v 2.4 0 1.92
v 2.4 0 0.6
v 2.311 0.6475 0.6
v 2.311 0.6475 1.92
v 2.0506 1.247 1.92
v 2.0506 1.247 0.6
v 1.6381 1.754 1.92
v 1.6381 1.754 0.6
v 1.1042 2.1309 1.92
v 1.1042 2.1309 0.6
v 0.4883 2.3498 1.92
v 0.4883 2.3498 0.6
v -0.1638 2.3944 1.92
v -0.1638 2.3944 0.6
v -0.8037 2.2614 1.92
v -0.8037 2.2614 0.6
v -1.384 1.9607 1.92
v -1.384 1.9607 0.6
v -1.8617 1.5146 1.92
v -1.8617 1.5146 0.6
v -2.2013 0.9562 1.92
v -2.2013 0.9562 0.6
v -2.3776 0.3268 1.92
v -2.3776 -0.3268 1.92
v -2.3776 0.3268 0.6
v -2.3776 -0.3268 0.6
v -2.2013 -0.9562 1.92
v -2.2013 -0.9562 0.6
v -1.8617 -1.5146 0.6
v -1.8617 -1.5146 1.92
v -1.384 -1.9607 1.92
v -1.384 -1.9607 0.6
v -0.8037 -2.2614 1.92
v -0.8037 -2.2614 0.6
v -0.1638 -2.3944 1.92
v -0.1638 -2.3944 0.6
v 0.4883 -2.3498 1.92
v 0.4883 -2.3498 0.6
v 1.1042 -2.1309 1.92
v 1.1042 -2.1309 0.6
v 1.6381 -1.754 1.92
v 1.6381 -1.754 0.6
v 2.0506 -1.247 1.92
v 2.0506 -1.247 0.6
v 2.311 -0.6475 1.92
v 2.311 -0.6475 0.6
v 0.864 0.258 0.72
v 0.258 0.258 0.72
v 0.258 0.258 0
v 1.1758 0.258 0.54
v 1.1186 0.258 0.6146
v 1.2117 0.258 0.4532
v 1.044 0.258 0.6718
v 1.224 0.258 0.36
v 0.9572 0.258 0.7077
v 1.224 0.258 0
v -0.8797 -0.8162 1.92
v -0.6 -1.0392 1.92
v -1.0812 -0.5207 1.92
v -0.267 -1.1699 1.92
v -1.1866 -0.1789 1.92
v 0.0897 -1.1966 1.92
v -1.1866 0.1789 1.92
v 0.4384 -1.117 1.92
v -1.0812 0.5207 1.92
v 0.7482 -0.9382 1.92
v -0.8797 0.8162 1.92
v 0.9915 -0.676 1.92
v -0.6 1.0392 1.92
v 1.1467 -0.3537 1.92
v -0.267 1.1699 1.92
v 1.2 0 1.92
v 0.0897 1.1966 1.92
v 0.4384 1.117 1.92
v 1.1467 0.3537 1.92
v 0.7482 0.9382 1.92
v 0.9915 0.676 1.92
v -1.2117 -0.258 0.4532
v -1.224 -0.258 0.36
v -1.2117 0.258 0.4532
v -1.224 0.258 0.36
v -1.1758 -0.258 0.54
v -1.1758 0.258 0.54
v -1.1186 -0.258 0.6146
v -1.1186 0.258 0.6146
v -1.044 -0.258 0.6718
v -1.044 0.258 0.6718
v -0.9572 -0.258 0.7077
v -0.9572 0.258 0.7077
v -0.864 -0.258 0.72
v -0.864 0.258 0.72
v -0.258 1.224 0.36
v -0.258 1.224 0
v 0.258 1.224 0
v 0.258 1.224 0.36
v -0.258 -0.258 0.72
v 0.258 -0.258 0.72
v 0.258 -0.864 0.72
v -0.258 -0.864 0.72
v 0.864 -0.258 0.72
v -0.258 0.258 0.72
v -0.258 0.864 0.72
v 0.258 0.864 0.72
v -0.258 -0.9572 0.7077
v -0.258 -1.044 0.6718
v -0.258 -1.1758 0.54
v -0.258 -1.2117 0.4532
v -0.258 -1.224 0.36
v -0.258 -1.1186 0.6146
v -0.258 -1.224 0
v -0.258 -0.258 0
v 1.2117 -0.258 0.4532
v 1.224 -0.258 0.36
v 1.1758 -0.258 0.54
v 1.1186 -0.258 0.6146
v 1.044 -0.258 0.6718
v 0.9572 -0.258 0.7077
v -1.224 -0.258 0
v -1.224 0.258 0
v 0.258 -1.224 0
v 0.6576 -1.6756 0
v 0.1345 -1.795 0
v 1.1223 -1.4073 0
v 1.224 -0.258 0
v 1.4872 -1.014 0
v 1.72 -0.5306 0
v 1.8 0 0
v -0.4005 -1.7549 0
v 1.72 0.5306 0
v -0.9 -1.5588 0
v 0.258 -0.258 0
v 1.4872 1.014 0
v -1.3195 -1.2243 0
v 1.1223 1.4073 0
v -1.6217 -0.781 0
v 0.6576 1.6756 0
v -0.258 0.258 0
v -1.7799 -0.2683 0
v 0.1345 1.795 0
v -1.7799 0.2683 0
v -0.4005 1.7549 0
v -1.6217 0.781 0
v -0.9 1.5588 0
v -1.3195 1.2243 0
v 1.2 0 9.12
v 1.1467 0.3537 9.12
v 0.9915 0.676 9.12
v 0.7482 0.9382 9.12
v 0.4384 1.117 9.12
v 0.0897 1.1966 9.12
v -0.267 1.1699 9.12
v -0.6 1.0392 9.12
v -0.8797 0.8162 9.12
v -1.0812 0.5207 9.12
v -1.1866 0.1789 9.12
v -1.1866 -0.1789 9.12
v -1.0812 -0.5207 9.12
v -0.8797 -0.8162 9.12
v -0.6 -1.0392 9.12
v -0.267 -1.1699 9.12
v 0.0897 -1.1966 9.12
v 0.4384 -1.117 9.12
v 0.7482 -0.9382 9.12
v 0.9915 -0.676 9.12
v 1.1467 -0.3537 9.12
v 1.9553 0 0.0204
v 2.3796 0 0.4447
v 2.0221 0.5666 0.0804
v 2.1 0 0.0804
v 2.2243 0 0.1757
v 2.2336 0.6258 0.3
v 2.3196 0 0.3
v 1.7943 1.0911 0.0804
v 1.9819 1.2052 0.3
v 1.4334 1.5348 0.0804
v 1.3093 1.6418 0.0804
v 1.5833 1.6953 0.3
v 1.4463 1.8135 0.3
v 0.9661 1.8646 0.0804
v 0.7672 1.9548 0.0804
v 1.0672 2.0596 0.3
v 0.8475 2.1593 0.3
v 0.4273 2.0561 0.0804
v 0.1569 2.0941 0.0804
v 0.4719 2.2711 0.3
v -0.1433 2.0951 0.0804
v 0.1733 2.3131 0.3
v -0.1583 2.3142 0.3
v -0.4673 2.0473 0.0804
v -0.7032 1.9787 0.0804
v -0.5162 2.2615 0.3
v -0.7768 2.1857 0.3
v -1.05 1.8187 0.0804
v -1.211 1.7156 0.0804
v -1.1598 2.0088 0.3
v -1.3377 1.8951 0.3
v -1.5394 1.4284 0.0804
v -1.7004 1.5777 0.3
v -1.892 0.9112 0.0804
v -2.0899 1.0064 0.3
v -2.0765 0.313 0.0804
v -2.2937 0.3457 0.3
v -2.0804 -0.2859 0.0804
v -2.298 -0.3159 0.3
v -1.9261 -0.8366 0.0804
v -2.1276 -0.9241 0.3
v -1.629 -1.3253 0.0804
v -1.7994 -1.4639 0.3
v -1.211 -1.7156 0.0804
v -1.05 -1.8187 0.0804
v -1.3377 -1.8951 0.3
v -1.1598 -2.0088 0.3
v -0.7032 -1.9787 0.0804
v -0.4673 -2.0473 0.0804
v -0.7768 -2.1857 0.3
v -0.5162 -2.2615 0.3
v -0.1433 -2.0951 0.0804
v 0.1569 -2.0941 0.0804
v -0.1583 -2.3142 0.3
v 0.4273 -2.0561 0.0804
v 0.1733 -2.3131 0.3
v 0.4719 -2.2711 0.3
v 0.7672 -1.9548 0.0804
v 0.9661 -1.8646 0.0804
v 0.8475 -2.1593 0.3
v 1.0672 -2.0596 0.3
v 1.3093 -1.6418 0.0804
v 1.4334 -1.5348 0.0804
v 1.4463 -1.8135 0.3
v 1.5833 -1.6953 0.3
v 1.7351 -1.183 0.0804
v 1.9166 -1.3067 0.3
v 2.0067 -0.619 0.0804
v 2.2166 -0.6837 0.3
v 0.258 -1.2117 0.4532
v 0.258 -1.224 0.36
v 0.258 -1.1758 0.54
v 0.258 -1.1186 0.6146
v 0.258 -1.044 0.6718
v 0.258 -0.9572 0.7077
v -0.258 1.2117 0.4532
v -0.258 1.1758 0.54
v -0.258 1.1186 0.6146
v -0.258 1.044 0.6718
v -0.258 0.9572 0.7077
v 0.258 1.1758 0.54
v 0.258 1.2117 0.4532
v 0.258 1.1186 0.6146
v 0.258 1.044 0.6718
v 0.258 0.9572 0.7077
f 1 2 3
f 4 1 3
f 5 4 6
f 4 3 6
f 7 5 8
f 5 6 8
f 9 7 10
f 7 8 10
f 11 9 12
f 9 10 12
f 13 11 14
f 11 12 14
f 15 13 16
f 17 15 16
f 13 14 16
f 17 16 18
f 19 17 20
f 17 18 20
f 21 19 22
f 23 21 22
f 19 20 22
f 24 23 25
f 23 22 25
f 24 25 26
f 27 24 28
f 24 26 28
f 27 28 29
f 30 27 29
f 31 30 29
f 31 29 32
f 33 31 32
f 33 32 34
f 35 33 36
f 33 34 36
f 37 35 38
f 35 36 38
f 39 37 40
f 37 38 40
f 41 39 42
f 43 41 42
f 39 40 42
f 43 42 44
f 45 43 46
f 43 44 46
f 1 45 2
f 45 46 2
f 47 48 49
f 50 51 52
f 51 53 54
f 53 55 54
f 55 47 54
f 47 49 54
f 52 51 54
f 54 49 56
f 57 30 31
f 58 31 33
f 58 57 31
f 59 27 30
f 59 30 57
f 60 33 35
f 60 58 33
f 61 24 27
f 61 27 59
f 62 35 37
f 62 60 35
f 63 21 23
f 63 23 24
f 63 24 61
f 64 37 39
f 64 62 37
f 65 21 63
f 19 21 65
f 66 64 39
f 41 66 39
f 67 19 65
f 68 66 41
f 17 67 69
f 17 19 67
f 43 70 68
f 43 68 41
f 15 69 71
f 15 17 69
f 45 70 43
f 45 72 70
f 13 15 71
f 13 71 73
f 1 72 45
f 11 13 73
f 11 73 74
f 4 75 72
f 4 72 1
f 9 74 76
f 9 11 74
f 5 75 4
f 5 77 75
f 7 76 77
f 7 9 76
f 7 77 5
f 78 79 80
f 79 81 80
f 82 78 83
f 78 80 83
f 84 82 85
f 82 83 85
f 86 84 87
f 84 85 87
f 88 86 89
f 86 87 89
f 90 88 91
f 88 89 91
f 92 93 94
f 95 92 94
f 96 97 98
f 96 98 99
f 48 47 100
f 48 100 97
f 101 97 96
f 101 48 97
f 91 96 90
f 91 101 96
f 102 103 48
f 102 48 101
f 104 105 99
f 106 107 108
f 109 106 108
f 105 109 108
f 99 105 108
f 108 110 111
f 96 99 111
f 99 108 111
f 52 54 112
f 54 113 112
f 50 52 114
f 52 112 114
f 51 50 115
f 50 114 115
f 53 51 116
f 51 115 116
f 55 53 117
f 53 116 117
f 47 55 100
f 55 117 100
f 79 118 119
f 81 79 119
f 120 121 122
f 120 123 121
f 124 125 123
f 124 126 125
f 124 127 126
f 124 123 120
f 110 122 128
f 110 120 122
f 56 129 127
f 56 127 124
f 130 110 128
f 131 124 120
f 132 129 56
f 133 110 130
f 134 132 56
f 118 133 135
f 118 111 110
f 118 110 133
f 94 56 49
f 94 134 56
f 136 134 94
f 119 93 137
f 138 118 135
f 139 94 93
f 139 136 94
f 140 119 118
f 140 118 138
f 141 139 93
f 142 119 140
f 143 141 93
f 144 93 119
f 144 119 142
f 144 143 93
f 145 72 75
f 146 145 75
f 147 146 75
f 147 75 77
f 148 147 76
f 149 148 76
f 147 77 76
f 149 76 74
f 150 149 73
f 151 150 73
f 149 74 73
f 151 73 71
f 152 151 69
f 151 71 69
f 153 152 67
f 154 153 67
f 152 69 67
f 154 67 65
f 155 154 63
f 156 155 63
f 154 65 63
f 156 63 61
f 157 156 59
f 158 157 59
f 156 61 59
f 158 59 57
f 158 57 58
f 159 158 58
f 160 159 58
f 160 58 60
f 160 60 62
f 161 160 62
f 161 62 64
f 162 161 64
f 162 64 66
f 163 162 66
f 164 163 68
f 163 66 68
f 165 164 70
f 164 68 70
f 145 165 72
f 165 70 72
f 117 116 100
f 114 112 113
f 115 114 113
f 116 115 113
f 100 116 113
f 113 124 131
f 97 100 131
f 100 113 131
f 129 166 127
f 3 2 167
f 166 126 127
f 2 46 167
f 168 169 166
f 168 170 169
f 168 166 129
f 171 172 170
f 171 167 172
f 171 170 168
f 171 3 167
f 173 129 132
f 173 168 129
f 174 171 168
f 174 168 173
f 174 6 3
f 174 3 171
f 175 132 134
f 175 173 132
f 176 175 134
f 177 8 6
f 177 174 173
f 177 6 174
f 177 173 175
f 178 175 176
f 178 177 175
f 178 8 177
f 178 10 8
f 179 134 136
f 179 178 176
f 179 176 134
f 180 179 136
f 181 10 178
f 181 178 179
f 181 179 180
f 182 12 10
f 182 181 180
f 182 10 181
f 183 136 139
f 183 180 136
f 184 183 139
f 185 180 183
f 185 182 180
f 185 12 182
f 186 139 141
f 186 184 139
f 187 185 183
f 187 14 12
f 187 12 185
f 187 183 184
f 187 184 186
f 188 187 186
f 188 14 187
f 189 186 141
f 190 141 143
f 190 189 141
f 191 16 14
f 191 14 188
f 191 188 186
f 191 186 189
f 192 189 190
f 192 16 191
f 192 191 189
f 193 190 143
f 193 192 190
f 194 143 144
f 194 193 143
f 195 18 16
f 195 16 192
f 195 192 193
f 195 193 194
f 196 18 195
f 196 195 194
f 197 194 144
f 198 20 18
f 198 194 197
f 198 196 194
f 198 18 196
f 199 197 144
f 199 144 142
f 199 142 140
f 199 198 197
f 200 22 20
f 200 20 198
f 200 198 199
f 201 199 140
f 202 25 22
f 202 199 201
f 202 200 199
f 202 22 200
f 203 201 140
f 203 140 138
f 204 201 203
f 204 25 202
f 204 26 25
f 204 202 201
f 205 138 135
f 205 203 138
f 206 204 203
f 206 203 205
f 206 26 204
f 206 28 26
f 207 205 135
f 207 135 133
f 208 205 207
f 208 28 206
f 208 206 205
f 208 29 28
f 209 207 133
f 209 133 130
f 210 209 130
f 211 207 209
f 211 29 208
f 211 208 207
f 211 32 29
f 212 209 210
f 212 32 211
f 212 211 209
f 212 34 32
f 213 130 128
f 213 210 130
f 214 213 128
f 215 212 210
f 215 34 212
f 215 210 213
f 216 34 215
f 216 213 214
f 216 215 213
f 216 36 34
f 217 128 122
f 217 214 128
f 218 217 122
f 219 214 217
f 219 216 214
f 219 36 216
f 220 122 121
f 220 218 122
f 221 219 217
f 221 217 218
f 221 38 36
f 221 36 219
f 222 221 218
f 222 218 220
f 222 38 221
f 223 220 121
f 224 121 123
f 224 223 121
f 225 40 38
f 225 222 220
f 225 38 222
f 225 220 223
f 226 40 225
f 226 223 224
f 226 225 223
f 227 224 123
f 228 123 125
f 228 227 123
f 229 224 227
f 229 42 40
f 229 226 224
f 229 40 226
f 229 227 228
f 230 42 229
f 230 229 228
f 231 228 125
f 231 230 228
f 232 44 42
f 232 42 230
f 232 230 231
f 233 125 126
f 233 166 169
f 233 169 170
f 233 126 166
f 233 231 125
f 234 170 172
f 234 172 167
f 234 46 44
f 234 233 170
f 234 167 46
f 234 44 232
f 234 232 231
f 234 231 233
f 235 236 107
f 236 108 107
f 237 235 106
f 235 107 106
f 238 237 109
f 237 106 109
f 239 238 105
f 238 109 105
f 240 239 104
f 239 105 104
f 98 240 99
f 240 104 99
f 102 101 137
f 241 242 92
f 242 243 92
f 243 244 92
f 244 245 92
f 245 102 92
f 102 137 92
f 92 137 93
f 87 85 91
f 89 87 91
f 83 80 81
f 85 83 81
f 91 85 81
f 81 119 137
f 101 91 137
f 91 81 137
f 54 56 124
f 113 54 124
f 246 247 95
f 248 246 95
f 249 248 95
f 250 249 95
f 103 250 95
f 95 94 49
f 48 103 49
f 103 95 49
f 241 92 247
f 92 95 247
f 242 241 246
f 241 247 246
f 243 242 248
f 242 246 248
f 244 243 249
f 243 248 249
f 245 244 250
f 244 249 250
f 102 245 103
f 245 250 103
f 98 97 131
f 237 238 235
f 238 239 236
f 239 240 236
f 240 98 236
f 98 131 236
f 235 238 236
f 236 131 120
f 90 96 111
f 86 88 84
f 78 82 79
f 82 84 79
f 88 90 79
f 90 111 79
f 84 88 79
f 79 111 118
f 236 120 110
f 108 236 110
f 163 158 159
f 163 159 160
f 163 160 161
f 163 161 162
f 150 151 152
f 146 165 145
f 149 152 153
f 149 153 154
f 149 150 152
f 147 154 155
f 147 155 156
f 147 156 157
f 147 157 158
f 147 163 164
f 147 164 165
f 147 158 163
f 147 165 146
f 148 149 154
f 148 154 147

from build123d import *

# Parameters (mm, degrees)
ESQUISSE1_R             = 2.4
ESQUISSE1_R_2           = 2.16514488
BOSS_EXTRU_1_DEPTH      = 1.92
ENL_V_MAT_EXTRU_1_DEPTH = 0.72
CONG_6_R                = 0.36
ESQUISSE3_R             = 1.2
BOSS_EXTRU_2_DEPTH      = 7.2
CONG_7_R                = 0.6


with BuildPart() as part:
    # Esquisse1 → Boss.-Extru.1 (new body)
    # profile 1 of 3: a face of its own
    with BuildSketch(Plane.XY):
        Circle(ESQUISSE1_R)
        Circle(ESQUISSE1_R_2, mode=Mode.SUBTRACT)
    # profile 2 of 3: a face of its own
    with BuildSketch(Plane.XY):
        Circle(ESQUISSE1_R_2)
        Polygon((-0.258, -1.318102798), (-0.258, -0.258), (-1.224, -0.258), (-1.224, 0.258), (-0.258, 0.258), (-0.258, 1.318102798), (0.258, 1.318102798), (0.258, 0.258), (1.224, 0.258), (1.224, -0.258), (0.258, -0.258), (0.258, -1.318102798), align=None, mode=Mode.SUBTRACT)
    # profile 3 of 3: a face of its own
    with BuildSketch(Plane.XY):
        Polygon((-0.258, -0.258), (-1.224, -0.258), (-1.224, 0.258), (-0.258, 0.258), (-0.258, 1.318102798), (0.258, 1.318102798), (0.258, 0.258), (1.224, 0.258), (1.224, -0.258), (0.258, -0.258), (0.258, -1.318102798), (-0.258, -1.318102798), align=None)
    extrude(amount=BOSS_EXTRU_1_DEPTH)

    # Esquisse2 → Enlèv. mat.-Extru.1 (cut)
    with BuildSketch(Plane(origin=(0, 0, 0), x_dir=(-1, 0, 0), z_dir=(0, 0, -1))):
        Polygon((0, -1.224), (0, 0), (-1.224, 0), (-1.224, -0.258), (-0.258, -0.258), (-0.258, -1.224), align=None)
        Polygon((0, 0), (0, 1.224), (-0.258, 1.224), (-0.258, 0.258), (-1.224, 0.258), (-1.224, 0), align=None)
        Polygon((0.258, 1.224), (0, 1.224), (0, 0), (1.224, 0), (1.224, 0.258), (0.258, 0.258), align=None)
        Polygon((1.224, 0), (0, 0), (0, -1.224), (0.258, -1.224), (0.258, -0.258), (1.224, -0.258), align=None)
    extrude(amount=-ENL_V_MAT_EXTRU_1_DEPTH, mode=Mode.SUBTRACT)

    # Congé6
    cong_6_edges = [part.edges().sort_by_distance(p)[0] for p in [
        (0, -1.224, 0.72),
        (1.224, 0, 0.72),
        (-1.224, 0, 0.72),
        (0, 1.224, 0.72),
    ]]
    fillet(cong_6_edges, radius=CONG_6_R)

    # Esquisse3 → Boss.-Extru.2 (add)
    with BuildSketch(Plane.XY.offset(1.92)):
        Circle(ESQUISSE3_R)
    extrude(amount=BOSS_EXTRU_2_DEPTH)

    # Congé7
    cong_7_edges = [part.edges().sort_by_distance(p)[0] for p in [
        (-2.4, 0, 0),
    ]]
    fillet(cong_7_edges, radius=CONG_7_R)


solid = part.part
